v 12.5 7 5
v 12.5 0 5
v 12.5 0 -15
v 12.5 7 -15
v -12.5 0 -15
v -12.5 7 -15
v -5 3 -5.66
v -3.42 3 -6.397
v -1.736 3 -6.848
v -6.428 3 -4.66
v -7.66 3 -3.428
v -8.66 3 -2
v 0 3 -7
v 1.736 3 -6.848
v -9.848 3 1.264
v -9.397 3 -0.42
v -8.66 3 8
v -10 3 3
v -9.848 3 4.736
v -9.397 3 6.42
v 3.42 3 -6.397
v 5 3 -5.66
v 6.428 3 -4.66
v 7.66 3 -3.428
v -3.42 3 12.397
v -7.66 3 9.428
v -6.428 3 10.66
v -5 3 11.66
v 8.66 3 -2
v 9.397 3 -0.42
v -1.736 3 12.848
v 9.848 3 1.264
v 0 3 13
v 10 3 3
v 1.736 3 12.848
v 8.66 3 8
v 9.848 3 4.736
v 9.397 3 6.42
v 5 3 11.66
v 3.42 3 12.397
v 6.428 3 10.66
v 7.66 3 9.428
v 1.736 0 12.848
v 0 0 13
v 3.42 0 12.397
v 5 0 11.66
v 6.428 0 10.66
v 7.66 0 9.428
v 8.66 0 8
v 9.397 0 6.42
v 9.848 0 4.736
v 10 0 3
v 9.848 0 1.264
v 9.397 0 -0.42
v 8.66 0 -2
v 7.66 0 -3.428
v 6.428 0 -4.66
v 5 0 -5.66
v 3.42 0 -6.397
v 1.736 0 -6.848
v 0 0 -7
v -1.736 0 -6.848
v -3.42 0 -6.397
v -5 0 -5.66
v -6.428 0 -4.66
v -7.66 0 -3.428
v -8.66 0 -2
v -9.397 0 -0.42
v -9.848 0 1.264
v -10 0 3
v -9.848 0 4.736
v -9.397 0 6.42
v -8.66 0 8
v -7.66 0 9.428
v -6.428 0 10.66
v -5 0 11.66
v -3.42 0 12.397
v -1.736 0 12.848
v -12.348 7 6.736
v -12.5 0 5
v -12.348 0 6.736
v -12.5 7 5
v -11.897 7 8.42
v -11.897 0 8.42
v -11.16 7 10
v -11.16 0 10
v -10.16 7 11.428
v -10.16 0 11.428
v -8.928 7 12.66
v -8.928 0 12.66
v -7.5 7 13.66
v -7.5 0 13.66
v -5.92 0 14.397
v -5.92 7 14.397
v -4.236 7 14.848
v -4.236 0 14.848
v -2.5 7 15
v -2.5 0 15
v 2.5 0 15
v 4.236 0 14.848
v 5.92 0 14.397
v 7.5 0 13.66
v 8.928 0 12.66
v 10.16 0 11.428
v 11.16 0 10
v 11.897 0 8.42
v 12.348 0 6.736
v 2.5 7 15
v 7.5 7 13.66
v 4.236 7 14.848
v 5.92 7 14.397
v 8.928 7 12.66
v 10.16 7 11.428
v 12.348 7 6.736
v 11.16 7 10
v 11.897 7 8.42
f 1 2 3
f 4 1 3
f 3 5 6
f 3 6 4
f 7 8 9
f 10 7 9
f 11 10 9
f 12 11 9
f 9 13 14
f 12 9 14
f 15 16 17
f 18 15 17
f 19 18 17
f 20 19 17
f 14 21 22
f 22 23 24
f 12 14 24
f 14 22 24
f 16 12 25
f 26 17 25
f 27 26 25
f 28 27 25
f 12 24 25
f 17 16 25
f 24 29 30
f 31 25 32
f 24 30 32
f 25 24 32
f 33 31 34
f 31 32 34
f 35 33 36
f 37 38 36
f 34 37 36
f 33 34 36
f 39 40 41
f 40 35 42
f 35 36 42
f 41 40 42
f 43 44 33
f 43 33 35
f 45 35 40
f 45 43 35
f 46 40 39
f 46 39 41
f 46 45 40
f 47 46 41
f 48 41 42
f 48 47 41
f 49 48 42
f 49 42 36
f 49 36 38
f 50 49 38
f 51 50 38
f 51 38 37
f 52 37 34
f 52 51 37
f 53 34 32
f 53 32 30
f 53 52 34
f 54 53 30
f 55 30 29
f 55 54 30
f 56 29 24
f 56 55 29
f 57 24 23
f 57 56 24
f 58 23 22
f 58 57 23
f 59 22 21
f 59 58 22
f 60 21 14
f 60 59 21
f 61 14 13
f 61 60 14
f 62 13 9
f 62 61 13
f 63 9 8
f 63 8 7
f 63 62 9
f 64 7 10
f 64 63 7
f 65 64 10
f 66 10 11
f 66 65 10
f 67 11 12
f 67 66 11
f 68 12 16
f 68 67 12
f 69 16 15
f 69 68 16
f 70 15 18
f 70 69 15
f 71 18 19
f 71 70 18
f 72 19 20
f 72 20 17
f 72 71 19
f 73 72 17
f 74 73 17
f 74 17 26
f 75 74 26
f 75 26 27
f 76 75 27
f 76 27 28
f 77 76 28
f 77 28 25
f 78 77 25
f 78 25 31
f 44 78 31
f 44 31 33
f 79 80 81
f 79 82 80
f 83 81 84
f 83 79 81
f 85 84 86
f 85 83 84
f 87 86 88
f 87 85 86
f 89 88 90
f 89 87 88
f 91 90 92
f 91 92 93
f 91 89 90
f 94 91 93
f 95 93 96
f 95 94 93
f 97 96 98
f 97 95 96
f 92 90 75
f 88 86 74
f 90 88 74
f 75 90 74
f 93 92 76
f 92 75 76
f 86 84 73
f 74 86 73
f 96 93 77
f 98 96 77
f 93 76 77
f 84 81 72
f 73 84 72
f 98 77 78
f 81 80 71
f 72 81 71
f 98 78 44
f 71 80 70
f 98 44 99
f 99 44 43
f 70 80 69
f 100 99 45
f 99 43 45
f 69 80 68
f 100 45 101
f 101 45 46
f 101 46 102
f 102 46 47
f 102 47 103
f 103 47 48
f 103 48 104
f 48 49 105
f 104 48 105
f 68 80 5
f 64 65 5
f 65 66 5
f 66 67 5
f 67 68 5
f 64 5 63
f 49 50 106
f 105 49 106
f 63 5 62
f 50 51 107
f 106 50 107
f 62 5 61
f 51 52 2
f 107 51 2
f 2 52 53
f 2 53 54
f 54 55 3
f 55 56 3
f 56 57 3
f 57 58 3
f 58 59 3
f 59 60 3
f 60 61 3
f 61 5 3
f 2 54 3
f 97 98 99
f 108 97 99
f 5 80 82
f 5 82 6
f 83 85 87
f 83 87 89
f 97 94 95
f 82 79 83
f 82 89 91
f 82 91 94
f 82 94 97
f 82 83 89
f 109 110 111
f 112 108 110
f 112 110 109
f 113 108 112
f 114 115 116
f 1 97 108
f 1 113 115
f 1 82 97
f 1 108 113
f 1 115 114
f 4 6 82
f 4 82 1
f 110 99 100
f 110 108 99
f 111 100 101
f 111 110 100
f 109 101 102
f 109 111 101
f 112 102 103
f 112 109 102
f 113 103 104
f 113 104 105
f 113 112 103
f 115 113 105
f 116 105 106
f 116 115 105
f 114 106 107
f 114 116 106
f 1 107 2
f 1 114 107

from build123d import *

# Parameters (mm, degrees)
SKETCH1_W           = 25
SKETCH1_H           = 30
BOSS_EXTRUDE1_DEPTH = 7
SKETCH2_R           = 10
CUT_EXTRUDE1_DEPTH  = 3
FILLET1_R           = 10
FILLET2_R           = 10


with BuildPart() as part:
    # Sketch1 → Boss-Extrude1 (new body)
    with BuildSketch(Plane(origin=(0, 0, 0), x_dir=(1, 0, 0), z_dir=(0, 1, 0))):
        Rectangle(SKETCH1_W, SKETCH1_H)
    extrude(amount=BOSS_EXTRUDE1_DEPTH)

    # Sketch2 → Cut-Extrude1 (cut)
    with BuildSketch(Plane(origin=(0, 0, 0), x_dir=(1, 0, 0), z_dir=(0, 1, 0))):
        with Locations(Location((0, -3, 0), (0, 0, 270))):
            Circle(SKETCH2_R)
    extrude(amount=CUT_EXTRUDE1_DEPTH, mode=Mode.SUBTRACT)

    # Fillet1
    fillet1_edges = [part.edges().sort_by_distance(p)[0] for p in [
        (-12.5, 3.5, 15),
    ]]
    fillet(fillet1_edges, radius=FILLET1_R)

    # Fillet2
    fillet2_edges = [part.edges().sort_by_distance(p)[0] for p in [
        (12.5, 3.5, 15),
    ]]
    fillet(fillet2_edges, radius=FILLET2_R)


solid = part.part
